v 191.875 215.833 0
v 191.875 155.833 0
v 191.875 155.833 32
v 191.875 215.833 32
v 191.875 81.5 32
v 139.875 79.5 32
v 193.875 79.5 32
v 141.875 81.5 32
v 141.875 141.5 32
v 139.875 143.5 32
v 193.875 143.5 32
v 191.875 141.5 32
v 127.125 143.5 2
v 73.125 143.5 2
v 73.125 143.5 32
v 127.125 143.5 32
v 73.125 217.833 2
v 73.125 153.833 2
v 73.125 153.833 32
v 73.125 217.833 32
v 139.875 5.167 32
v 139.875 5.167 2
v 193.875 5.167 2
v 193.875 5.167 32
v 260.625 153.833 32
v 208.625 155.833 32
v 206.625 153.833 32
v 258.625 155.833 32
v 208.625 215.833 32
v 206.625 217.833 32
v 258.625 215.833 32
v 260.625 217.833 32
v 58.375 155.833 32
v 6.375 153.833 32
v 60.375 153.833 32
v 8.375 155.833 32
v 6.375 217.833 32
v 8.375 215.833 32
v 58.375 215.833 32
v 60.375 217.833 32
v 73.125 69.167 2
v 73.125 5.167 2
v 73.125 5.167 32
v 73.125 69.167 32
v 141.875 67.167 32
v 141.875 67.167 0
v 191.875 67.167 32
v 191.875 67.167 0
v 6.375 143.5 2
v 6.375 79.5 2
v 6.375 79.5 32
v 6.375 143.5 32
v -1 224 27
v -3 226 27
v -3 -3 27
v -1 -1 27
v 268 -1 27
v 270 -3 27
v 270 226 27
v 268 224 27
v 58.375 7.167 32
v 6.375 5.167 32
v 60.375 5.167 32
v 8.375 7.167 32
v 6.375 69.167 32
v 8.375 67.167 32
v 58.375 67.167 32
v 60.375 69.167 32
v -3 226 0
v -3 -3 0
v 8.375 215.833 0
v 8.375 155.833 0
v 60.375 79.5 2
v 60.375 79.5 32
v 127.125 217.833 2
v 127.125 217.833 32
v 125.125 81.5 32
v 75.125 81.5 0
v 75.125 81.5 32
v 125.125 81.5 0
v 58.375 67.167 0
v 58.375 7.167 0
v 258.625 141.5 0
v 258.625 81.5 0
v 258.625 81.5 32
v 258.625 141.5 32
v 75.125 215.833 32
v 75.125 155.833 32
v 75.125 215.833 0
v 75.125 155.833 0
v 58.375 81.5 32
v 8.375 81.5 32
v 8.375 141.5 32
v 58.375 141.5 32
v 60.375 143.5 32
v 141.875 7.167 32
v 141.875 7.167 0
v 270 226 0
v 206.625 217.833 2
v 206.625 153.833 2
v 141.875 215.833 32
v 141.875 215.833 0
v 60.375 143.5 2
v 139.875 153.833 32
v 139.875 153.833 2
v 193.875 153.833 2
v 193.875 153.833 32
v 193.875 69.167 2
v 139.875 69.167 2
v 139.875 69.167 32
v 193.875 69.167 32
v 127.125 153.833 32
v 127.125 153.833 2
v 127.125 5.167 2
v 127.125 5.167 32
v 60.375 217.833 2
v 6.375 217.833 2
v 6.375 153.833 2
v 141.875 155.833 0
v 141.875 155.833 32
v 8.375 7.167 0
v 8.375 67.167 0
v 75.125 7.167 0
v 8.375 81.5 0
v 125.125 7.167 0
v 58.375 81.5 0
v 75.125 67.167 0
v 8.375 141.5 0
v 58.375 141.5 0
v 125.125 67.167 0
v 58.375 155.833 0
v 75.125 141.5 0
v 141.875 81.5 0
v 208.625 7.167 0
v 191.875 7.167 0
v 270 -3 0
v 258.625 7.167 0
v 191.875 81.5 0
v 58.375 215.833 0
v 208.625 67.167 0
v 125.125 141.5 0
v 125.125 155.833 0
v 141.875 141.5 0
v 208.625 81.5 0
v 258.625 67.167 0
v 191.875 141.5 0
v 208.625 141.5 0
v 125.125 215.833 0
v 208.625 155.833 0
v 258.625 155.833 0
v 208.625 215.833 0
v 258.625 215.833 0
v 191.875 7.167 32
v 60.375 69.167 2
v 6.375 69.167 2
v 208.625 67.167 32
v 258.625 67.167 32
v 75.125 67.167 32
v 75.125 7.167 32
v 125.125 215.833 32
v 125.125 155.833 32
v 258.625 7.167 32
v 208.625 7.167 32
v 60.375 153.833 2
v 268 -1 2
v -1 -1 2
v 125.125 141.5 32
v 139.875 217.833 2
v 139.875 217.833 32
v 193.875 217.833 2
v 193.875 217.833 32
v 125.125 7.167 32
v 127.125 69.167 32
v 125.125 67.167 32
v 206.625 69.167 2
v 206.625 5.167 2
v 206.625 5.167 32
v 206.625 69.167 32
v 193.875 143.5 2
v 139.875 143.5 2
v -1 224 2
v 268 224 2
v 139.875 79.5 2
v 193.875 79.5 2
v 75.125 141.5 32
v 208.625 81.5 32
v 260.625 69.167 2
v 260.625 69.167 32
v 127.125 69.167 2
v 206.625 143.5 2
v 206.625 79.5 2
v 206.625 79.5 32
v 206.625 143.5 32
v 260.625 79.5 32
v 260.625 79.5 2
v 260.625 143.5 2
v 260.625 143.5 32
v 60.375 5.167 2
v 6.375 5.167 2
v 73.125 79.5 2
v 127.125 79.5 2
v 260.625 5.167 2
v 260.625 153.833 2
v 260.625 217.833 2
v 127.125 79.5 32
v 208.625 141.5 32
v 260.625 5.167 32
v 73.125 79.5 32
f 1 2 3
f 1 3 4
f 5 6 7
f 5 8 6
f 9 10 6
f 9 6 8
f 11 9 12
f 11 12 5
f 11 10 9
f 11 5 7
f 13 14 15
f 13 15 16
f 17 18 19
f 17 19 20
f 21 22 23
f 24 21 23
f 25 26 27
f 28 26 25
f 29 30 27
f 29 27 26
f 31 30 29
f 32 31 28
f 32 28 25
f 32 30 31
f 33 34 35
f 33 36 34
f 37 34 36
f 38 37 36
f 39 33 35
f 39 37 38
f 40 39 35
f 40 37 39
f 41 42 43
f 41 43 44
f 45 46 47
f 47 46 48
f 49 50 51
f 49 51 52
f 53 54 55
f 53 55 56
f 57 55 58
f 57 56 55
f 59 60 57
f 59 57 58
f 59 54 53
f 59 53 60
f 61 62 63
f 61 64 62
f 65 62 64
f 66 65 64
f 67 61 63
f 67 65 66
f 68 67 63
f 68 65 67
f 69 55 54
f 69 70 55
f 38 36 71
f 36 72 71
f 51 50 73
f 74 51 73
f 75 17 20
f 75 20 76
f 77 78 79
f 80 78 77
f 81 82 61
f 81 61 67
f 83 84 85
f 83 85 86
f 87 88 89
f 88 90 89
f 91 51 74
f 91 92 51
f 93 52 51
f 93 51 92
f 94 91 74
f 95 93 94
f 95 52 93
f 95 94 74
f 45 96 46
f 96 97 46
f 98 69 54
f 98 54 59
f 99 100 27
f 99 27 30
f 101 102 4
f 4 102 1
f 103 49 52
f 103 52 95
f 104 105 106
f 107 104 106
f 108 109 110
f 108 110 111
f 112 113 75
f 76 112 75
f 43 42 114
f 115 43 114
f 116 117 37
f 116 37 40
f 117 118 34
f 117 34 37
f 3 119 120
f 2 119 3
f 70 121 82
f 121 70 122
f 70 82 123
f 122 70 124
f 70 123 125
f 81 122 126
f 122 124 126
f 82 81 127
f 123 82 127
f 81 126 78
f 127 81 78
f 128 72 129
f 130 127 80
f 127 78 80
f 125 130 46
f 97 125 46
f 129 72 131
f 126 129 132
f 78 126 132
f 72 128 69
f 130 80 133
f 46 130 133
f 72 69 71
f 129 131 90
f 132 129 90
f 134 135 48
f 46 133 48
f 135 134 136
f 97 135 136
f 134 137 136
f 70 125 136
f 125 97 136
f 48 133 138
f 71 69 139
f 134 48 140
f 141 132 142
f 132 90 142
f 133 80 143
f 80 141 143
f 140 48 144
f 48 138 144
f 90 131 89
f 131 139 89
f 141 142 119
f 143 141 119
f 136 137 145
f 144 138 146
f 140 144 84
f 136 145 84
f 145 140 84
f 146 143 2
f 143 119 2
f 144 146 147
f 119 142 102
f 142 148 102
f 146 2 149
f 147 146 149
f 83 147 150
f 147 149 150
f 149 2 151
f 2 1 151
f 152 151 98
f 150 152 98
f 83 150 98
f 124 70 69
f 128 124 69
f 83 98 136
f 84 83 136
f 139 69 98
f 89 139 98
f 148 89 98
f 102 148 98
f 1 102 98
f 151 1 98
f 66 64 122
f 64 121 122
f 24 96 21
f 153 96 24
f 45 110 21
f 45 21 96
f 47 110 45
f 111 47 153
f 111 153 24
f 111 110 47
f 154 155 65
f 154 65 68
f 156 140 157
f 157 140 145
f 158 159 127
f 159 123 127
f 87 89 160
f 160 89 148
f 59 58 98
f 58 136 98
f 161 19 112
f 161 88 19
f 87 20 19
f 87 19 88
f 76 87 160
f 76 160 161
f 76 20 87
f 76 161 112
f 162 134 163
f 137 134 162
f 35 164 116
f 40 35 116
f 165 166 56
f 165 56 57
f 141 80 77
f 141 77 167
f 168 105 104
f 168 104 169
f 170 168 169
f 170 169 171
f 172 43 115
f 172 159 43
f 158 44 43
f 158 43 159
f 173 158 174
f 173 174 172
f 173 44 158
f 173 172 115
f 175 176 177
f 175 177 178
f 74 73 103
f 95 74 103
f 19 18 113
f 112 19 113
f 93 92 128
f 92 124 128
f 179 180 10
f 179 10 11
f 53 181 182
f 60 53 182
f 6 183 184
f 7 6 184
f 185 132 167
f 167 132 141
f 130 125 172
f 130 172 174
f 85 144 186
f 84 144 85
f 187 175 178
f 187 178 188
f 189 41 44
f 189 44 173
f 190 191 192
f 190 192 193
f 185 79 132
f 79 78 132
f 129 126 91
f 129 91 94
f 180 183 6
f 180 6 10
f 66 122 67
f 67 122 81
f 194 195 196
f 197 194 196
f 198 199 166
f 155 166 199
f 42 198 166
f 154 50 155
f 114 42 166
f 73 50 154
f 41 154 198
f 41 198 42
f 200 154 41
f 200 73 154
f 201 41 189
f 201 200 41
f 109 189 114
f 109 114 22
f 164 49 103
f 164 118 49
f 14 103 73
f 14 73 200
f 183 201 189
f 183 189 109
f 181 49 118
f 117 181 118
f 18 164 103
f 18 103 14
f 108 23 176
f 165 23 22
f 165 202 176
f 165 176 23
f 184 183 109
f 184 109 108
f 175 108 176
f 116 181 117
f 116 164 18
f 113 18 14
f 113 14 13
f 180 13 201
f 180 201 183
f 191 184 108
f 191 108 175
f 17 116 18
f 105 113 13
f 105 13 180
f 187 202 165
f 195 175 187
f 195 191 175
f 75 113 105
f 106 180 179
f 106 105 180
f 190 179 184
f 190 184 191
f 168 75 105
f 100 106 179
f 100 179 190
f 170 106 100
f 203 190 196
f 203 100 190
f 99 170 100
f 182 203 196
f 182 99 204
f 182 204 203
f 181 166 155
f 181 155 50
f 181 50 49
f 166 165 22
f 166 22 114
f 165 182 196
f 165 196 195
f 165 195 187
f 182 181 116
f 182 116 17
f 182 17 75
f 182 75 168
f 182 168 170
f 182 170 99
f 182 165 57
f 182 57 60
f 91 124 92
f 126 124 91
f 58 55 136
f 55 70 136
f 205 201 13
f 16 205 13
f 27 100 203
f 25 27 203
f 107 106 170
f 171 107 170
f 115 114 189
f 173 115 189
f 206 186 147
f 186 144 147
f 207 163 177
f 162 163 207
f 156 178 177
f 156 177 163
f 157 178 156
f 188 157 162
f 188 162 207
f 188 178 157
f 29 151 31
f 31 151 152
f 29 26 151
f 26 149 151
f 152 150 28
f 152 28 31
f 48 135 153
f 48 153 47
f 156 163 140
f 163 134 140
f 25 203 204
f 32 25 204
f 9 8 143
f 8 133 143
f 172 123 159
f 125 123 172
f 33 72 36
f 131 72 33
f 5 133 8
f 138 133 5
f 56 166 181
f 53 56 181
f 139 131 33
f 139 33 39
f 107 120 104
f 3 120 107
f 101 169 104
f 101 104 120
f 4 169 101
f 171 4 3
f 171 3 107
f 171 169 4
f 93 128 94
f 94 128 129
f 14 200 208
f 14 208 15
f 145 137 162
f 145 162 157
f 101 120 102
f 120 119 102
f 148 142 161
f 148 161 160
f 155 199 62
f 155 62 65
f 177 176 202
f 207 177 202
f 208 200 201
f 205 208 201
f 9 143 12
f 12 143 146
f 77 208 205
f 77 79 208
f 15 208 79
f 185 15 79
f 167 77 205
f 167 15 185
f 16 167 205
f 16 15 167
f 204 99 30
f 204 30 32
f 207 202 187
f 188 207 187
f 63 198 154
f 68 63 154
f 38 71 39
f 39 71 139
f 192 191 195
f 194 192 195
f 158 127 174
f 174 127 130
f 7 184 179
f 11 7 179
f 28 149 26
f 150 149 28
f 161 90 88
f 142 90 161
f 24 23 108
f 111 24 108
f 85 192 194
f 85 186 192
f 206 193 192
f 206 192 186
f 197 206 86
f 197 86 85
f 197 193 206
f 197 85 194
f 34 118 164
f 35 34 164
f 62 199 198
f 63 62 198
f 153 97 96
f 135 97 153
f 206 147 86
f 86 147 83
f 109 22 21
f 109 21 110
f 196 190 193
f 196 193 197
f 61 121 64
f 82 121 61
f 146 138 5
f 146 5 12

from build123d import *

# Parameters (mm, degrees)
F0_W     = 273
F0_H     = 229
F0_W_2   = 50
F0_H_2   = 60
F1_DEPTH = 2
F2_W     = 273
F2_H     = 229
F2_W_2   = 269
F2_H_2   = 225
F3_DEPTH = 25
F4_W     = 54
F4_H     = 64
F4_W_2   = 50
F4_H_2   = 60
F5_DEPTH = 30


with BuildPart() as f1:
    # F0 (on Top) → F1 (new body)
    with BuildSketch(Plane.XY):
        with Locations((133.5, 111.5)):
            Rectangle(F0_W, F0_H)
        with Locations((33.375, 37.167333)):
            Rectangle(F0_W_2, F0_H_2, mode=Mode.SUBTRACT)
        with Locations((100.125, 37.167333)):
            Rectangle(F0_W_2, F0_H_2, mode=Mode.SUBTRACT)
        with Locations((166.875, 37.167333)):
            Rectangle(F0_W_2, F0_H_2, mode=Mode.SUBTRACT)
        with Locations((233.625, 37.167333)):
            Rectangle(F0_W_2, F0_H_2, mode=Mode.SUBTRACT)
        with Locations((33.375, 111.500333)):
            Rectangle(F0_W_2, F0_H_2, mode=Mode.SUBTRACT)
        with Locations((100.125, 111.500333)):
            Rectangle(F0_W_2, F0_H_2, mode=Mode.SUBTRACT)
        with Locations((33.375, 185.833333)):
            Rectangle(F0_W_2, F0_H_2, mode=Mode.SUBTRACT)
        with Locations((100.125, 185.833333)):
            Rectangle(F0_W_2, F0_H_2, mode=Mode.SUBTRACT)
        with Locations((166.875, 111.500333)):
            Rectangle(F0_W_2, F0_H_2, mode=Mode.SUBTRACT)
        with Locations((233.625, 111.500333)):
            Rectangle(F0_W_2, F0_H_2, mode=Mode.SUBTRACT)
        with Locations((166.875, 185.833333)):
            Rectangle(F0_W_2, F0_H_2, mode=Mode.SUBTRACT)
        with Locations((233.625, 185.833333)):
            Rectangle(F0_W_2, F0_H_2, mode=Mode.SUBTRACT)
    extrude(amount=F1_DEPTH)

    # F2 (on face) → F3 (join)
    with BuildSketch(Plane.XY.offset(2)):
        with Locations((133.5, 111.5)):
            Rectangle(F2_W, F2_H)
        with Locations((133.5, 111.5)):
            Rectangle(F2_W_2, F2_H_2, mode=Mode.SUBTRACT)
    extrude(amount=F3_DEPTH)

    # F4 (on face) → F5 (join)
    with BuildSketch(Plane.XY.offset(2)):
        with Locations((33.375, 185.833333)):
            Rectangle(F4_W, F4_H)
        with Locations((33.375, 185.833333)):
            Rectangle(F4_W_2, F4_H_2, mode=Mode.SUBTRACT)
        with Locations((33.375, 111.500333)):
            Rectangle(F4_W, F4_H)
        with Locations((33.375, 111.500333)):
            Rectangle(F4_W_2, F4_H_2, mode=Mode.SUBTRACT)
        with Locations((33.375, 37.167333)):
            Rectangle(F4_W, F4_H)
        with Locations((33.375, 37.167333)):
            Rectangle(F4_W_2, F4_H_2, mode=Mode.SUBTRACT)
        with Locations((100.125, 185.833333)):
            Rectangle(F4_W, F4_H)
        with Locations((100.125, 185.833333)):
            Rectangle(F4_W_2, F4_H_2, mode=Mode.SUBTRACT)
        with Locations((100.125, 111.500333)):
            Rectangle(F4_W, F4_H)
        with Locations((100.125, 111.500333)):
            Rectangle(F4_W_2, F4_H_2, mode=Mode.SUBTRACT)
        with Locations((100.125, 37.167333)):
            Rectangle(F4_W, F4_H)
        with Locations((100.125, 37.167333)):
            Rectangle(F4_W_2, F4_H_2, mode=Mode.SUBTRACT)
        with Locations((166.875, 185.833333)):
            Rectangle(F4_W, F4_H)
        with Locations((166.875, 185.833333)):
            Rectangle(F4_W_2, F4_H_2, mode=Mode.SUBTRACT)
        with Locations((166.875, 111.500333)):
            Rectangle(F4_W, F4_H)
        with Locations((166.875, 111.500333)):
            Rectangle(F4_W_2, F4_H_2, mode=Mode.SUBTRACT)
        with Locations((166.875, 37.167333)):
            Rectangle(F4_W, F4_H)
        with Locations((166.875, 37.167333)):
            Rectangle(F4_W_2, F4_H_2, mode=Mode.SUBTRACT)
        with Locations((233.625, 185.833333)):
            Rectangle(F4_W, F4_H)
        with Locations((233.625, 185.833333)):
            Rectangle(F4_W_2, F4_H_2, mode=Mode.SUBTRACT)
        with Locations((233.625, 111.500333)):
            Rectangle(F4_W, F4_H)
        with Locations((233.625, 111.500333)):
            Rectangle(F4_W_2, F4_H_2, mode=Mode.SUBTRACT)
        with Locations((233.625, 37.167333)):
            Rectangle(F4_W, F4_H)
        with Locations((233.625, 37.167333)):
            Rectangle(F4_W_2, F4_H_2, mode=Mode.SUBTRACT)
    extrude(amount=F5_DEPTH)


solid = f1.part
